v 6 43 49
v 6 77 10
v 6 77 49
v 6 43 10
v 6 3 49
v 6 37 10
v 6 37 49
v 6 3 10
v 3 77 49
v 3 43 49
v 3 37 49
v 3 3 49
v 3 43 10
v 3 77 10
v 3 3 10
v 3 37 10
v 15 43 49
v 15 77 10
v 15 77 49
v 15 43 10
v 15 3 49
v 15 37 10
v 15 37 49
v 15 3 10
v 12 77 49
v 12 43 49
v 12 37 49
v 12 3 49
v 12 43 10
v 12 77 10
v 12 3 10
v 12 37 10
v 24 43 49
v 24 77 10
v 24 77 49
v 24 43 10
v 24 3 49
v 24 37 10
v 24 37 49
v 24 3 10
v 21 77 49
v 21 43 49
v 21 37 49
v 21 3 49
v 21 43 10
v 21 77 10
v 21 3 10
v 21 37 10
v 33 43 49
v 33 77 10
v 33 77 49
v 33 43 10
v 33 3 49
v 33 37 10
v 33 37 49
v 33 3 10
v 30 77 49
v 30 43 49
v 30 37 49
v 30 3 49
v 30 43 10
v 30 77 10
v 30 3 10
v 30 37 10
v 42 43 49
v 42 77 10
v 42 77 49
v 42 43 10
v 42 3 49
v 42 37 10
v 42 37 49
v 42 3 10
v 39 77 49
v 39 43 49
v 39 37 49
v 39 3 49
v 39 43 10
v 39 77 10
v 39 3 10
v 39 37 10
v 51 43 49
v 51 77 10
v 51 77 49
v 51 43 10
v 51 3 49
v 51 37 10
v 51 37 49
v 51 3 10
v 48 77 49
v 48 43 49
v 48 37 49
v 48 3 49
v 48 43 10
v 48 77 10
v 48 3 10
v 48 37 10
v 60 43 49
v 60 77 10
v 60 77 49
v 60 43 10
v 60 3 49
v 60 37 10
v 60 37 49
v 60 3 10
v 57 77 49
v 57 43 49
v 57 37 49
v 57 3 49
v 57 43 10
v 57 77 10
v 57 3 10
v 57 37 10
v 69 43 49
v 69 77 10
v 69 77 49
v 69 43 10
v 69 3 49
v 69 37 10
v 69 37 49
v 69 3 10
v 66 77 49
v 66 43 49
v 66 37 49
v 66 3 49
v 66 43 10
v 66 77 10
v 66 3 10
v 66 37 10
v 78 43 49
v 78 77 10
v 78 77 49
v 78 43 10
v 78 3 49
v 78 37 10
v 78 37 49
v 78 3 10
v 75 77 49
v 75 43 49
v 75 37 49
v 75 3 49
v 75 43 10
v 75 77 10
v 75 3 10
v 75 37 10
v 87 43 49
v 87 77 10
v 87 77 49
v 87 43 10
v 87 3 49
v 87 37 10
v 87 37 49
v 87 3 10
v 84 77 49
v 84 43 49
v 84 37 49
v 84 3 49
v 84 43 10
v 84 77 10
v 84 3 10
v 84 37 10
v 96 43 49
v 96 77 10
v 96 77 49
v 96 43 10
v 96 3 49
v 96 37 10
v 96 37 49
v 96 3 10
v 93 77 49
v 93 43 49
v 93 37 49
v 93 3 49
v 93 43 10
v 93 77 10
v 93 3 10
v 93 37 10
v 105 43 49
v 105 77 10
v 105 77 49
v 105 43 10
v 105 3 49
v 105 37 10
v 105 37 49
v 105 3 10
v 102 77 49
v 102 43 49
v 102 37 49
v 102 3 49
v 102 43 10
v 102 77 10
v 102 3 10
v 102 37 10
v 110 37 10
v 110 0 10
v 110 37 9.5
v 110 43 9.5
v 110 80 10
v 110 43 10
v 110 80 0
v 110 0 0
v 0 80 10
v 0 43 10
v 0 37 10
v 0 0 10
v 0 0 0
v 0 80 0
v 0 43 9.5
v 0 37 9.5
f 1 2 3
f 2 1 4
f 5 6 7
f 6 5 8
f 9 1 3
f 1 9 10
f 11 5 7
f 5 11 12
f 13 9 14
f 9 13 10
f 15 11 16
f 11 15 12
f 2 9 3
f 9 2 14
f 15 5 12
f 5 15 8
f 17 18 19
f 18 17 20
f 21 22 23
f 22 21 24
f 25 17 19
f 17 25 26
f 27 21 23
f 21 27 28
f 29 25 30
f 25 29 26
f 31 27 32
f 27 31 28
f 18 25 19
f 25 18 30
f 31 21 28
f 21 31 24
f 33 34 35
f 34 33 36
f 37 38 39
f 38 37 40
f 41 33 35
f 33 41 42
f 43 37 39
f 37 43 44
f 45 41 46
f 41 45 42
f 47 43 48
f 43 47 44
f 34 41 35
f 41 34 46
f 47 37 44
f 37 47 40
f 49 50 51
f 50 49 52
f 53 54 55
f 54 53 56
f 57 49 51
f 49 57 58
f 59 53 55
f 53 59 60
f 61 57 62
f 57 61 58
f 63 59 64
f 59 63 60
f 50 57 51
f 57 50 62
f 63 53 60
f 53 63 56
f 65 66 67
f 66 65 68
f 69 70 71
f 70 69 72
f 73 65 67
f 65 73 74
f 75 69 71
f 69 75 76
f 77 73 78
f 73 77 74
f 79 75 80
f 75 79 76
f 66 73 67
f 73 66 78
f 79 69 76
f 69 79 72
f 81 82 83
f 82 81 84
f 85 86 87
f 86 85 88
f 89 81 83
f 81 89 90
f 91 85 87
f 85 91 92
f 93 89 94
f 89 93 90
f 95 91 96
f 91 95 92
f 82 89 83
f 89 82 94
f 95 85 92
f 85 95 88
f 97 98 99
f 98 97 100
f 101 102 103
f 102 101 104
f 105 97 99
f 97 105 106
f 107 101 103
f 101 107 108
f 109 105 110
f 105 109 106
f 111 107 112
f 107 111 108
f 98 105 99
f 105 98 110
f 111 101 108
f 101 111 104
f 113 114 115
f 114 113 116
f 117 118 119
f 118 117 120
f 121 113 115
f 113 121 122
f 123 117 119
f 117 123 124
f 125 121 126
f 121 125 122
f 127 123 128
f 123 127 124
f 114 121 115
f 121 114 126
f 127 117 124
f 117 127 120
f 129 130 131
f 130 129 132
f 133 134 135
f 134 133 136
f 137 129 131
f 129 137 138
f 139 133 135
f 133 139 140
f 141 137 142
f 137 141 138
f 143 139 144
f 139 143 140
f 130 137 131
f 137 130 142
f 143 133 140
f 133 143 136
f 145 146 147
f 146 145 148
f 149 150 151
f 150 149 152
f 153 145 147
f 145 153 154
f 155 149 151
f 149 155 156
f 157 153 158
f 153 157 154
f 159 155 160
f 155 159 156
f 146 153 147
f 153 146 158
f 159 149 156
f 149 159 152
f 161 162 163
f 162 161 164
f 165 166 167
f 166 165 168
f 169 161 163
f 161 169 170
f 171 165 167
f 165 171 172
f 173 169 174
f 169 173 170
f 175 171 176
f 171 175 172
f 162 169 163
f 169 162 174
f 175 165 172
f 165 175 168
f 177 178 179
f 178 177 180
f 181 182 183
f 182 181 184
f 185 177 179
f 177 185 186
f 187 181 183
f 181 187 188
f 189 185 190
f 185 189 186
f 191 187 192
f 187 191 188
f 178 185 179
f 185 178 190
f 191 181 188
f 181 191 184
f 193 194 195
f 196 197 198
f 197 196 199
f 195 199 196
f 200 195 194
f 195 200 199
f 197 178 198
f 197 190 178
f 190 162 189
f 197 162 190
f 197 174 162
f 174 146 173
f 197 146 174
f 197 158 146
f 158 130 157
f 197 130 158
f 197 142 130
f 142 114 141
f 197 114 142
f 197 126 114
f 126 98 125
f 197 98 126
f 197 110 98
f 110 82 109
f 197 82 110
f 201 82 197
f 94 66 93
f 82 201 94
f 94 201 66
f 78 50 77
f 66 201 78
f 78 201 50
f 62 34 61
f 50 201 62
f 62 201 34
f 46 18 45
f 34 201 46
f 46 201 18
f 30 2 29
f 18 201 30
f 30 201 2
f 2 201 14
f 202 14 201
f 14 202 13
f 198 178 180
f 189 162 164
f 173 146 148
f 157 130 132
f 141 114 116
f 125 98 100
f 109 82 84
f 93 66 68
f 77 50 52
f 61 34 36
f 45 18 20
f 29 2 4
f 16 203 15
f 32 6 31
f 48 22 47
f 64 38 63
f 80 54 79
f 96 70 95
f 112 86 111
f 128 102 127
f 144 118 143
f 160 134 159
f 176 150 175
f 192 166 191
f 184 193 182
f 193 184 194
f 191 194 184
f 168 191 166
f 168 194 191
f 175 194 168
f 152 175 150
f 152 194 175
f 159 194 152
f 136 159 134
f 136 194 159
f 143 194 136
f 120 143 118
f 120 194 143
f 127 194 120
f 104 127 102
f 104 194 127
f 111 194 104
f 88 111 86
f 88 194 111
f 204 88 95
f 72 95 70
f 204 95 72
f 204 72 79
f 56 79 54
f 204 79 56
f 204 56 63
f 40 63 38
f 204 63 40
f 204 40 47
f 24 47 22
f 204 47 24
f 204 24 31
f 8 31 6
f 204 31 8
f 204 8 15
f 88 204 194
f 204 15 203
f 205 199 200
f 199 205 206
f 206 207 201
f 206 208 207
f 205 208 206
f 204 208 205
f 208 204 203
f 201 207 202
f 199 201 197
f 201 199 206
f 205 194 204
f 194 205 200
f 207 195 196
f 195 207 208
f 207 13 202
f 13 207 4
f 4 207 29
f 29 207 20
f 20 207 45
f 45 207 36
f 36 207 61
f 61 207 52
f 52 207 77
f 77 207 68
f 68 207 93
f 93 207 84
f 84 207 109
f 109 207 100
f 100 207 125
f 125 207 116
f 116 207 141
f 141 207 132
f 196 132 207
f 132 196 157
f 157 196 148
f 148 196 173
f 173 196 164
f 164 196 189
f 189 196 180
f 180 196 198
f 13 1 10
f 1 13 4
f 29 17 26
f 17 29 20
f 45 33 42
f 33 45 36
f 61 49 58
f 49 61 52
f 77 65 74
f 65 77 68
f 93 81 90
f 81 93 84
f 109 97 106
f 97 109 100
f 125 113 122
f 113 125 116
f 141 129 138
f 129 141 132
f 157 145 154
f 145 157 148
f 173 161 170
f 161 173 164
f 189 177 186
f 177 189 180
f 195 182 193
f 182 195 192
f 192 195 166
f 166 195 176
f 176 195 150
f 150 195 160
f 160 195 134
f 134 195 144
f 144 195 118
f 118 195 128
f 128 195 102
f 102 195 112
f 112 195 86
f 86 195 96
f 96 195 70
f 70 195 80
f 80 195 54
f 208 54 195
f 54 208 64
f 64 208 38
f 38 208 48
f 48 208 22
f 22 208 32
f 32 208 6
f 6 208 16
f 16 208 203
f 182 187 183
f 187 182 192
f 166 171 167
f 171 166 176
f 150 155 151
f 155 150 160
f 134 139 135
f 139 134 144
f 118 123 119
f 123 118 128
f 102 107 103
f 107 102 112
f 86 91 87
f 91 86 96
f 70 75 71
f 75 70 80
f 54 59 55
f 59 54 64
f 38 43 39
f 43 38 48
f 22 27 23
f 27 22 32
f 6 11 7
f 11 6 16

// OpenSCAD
$fn = 32;

// ----------------------------------------------------------------------
// Heatsink: slotted fin block
// ----------------------------------------------------------------------

// --- parameters (mm) ---
base_l = 110;             // base length, X
base_w = 80;              // base width, Y
base_t = 10;              // base plate thickness
fin_h = 40;               // fin height above the base
fin_t = 3;                // fin thickness
edge = 3;                 // margin from the base ends
pitch = 9;                // fin pitch
slot_w = 6;               // central slot width, Y

n_fins = floor((base_l - 2 * edge - fin_t) / pitch) + 1;  // fin count
total_h = base_t + fin_h - 1;  // overall height

difference() {
union() {
  cube([base_l, base_w, base_t]);
  for (i = [0 : n_fins - 1])
    translate([edge + i * pitch, edge, base_t - 1])
      cube([fin_t, base_w - 2 * edge, fin_h]);
}
  translate([-1, base_w / 2 - slot_w / 2, base_t - 0.5])
    cube([base_l + 2, slot_w, fin_h + 2]);
}
